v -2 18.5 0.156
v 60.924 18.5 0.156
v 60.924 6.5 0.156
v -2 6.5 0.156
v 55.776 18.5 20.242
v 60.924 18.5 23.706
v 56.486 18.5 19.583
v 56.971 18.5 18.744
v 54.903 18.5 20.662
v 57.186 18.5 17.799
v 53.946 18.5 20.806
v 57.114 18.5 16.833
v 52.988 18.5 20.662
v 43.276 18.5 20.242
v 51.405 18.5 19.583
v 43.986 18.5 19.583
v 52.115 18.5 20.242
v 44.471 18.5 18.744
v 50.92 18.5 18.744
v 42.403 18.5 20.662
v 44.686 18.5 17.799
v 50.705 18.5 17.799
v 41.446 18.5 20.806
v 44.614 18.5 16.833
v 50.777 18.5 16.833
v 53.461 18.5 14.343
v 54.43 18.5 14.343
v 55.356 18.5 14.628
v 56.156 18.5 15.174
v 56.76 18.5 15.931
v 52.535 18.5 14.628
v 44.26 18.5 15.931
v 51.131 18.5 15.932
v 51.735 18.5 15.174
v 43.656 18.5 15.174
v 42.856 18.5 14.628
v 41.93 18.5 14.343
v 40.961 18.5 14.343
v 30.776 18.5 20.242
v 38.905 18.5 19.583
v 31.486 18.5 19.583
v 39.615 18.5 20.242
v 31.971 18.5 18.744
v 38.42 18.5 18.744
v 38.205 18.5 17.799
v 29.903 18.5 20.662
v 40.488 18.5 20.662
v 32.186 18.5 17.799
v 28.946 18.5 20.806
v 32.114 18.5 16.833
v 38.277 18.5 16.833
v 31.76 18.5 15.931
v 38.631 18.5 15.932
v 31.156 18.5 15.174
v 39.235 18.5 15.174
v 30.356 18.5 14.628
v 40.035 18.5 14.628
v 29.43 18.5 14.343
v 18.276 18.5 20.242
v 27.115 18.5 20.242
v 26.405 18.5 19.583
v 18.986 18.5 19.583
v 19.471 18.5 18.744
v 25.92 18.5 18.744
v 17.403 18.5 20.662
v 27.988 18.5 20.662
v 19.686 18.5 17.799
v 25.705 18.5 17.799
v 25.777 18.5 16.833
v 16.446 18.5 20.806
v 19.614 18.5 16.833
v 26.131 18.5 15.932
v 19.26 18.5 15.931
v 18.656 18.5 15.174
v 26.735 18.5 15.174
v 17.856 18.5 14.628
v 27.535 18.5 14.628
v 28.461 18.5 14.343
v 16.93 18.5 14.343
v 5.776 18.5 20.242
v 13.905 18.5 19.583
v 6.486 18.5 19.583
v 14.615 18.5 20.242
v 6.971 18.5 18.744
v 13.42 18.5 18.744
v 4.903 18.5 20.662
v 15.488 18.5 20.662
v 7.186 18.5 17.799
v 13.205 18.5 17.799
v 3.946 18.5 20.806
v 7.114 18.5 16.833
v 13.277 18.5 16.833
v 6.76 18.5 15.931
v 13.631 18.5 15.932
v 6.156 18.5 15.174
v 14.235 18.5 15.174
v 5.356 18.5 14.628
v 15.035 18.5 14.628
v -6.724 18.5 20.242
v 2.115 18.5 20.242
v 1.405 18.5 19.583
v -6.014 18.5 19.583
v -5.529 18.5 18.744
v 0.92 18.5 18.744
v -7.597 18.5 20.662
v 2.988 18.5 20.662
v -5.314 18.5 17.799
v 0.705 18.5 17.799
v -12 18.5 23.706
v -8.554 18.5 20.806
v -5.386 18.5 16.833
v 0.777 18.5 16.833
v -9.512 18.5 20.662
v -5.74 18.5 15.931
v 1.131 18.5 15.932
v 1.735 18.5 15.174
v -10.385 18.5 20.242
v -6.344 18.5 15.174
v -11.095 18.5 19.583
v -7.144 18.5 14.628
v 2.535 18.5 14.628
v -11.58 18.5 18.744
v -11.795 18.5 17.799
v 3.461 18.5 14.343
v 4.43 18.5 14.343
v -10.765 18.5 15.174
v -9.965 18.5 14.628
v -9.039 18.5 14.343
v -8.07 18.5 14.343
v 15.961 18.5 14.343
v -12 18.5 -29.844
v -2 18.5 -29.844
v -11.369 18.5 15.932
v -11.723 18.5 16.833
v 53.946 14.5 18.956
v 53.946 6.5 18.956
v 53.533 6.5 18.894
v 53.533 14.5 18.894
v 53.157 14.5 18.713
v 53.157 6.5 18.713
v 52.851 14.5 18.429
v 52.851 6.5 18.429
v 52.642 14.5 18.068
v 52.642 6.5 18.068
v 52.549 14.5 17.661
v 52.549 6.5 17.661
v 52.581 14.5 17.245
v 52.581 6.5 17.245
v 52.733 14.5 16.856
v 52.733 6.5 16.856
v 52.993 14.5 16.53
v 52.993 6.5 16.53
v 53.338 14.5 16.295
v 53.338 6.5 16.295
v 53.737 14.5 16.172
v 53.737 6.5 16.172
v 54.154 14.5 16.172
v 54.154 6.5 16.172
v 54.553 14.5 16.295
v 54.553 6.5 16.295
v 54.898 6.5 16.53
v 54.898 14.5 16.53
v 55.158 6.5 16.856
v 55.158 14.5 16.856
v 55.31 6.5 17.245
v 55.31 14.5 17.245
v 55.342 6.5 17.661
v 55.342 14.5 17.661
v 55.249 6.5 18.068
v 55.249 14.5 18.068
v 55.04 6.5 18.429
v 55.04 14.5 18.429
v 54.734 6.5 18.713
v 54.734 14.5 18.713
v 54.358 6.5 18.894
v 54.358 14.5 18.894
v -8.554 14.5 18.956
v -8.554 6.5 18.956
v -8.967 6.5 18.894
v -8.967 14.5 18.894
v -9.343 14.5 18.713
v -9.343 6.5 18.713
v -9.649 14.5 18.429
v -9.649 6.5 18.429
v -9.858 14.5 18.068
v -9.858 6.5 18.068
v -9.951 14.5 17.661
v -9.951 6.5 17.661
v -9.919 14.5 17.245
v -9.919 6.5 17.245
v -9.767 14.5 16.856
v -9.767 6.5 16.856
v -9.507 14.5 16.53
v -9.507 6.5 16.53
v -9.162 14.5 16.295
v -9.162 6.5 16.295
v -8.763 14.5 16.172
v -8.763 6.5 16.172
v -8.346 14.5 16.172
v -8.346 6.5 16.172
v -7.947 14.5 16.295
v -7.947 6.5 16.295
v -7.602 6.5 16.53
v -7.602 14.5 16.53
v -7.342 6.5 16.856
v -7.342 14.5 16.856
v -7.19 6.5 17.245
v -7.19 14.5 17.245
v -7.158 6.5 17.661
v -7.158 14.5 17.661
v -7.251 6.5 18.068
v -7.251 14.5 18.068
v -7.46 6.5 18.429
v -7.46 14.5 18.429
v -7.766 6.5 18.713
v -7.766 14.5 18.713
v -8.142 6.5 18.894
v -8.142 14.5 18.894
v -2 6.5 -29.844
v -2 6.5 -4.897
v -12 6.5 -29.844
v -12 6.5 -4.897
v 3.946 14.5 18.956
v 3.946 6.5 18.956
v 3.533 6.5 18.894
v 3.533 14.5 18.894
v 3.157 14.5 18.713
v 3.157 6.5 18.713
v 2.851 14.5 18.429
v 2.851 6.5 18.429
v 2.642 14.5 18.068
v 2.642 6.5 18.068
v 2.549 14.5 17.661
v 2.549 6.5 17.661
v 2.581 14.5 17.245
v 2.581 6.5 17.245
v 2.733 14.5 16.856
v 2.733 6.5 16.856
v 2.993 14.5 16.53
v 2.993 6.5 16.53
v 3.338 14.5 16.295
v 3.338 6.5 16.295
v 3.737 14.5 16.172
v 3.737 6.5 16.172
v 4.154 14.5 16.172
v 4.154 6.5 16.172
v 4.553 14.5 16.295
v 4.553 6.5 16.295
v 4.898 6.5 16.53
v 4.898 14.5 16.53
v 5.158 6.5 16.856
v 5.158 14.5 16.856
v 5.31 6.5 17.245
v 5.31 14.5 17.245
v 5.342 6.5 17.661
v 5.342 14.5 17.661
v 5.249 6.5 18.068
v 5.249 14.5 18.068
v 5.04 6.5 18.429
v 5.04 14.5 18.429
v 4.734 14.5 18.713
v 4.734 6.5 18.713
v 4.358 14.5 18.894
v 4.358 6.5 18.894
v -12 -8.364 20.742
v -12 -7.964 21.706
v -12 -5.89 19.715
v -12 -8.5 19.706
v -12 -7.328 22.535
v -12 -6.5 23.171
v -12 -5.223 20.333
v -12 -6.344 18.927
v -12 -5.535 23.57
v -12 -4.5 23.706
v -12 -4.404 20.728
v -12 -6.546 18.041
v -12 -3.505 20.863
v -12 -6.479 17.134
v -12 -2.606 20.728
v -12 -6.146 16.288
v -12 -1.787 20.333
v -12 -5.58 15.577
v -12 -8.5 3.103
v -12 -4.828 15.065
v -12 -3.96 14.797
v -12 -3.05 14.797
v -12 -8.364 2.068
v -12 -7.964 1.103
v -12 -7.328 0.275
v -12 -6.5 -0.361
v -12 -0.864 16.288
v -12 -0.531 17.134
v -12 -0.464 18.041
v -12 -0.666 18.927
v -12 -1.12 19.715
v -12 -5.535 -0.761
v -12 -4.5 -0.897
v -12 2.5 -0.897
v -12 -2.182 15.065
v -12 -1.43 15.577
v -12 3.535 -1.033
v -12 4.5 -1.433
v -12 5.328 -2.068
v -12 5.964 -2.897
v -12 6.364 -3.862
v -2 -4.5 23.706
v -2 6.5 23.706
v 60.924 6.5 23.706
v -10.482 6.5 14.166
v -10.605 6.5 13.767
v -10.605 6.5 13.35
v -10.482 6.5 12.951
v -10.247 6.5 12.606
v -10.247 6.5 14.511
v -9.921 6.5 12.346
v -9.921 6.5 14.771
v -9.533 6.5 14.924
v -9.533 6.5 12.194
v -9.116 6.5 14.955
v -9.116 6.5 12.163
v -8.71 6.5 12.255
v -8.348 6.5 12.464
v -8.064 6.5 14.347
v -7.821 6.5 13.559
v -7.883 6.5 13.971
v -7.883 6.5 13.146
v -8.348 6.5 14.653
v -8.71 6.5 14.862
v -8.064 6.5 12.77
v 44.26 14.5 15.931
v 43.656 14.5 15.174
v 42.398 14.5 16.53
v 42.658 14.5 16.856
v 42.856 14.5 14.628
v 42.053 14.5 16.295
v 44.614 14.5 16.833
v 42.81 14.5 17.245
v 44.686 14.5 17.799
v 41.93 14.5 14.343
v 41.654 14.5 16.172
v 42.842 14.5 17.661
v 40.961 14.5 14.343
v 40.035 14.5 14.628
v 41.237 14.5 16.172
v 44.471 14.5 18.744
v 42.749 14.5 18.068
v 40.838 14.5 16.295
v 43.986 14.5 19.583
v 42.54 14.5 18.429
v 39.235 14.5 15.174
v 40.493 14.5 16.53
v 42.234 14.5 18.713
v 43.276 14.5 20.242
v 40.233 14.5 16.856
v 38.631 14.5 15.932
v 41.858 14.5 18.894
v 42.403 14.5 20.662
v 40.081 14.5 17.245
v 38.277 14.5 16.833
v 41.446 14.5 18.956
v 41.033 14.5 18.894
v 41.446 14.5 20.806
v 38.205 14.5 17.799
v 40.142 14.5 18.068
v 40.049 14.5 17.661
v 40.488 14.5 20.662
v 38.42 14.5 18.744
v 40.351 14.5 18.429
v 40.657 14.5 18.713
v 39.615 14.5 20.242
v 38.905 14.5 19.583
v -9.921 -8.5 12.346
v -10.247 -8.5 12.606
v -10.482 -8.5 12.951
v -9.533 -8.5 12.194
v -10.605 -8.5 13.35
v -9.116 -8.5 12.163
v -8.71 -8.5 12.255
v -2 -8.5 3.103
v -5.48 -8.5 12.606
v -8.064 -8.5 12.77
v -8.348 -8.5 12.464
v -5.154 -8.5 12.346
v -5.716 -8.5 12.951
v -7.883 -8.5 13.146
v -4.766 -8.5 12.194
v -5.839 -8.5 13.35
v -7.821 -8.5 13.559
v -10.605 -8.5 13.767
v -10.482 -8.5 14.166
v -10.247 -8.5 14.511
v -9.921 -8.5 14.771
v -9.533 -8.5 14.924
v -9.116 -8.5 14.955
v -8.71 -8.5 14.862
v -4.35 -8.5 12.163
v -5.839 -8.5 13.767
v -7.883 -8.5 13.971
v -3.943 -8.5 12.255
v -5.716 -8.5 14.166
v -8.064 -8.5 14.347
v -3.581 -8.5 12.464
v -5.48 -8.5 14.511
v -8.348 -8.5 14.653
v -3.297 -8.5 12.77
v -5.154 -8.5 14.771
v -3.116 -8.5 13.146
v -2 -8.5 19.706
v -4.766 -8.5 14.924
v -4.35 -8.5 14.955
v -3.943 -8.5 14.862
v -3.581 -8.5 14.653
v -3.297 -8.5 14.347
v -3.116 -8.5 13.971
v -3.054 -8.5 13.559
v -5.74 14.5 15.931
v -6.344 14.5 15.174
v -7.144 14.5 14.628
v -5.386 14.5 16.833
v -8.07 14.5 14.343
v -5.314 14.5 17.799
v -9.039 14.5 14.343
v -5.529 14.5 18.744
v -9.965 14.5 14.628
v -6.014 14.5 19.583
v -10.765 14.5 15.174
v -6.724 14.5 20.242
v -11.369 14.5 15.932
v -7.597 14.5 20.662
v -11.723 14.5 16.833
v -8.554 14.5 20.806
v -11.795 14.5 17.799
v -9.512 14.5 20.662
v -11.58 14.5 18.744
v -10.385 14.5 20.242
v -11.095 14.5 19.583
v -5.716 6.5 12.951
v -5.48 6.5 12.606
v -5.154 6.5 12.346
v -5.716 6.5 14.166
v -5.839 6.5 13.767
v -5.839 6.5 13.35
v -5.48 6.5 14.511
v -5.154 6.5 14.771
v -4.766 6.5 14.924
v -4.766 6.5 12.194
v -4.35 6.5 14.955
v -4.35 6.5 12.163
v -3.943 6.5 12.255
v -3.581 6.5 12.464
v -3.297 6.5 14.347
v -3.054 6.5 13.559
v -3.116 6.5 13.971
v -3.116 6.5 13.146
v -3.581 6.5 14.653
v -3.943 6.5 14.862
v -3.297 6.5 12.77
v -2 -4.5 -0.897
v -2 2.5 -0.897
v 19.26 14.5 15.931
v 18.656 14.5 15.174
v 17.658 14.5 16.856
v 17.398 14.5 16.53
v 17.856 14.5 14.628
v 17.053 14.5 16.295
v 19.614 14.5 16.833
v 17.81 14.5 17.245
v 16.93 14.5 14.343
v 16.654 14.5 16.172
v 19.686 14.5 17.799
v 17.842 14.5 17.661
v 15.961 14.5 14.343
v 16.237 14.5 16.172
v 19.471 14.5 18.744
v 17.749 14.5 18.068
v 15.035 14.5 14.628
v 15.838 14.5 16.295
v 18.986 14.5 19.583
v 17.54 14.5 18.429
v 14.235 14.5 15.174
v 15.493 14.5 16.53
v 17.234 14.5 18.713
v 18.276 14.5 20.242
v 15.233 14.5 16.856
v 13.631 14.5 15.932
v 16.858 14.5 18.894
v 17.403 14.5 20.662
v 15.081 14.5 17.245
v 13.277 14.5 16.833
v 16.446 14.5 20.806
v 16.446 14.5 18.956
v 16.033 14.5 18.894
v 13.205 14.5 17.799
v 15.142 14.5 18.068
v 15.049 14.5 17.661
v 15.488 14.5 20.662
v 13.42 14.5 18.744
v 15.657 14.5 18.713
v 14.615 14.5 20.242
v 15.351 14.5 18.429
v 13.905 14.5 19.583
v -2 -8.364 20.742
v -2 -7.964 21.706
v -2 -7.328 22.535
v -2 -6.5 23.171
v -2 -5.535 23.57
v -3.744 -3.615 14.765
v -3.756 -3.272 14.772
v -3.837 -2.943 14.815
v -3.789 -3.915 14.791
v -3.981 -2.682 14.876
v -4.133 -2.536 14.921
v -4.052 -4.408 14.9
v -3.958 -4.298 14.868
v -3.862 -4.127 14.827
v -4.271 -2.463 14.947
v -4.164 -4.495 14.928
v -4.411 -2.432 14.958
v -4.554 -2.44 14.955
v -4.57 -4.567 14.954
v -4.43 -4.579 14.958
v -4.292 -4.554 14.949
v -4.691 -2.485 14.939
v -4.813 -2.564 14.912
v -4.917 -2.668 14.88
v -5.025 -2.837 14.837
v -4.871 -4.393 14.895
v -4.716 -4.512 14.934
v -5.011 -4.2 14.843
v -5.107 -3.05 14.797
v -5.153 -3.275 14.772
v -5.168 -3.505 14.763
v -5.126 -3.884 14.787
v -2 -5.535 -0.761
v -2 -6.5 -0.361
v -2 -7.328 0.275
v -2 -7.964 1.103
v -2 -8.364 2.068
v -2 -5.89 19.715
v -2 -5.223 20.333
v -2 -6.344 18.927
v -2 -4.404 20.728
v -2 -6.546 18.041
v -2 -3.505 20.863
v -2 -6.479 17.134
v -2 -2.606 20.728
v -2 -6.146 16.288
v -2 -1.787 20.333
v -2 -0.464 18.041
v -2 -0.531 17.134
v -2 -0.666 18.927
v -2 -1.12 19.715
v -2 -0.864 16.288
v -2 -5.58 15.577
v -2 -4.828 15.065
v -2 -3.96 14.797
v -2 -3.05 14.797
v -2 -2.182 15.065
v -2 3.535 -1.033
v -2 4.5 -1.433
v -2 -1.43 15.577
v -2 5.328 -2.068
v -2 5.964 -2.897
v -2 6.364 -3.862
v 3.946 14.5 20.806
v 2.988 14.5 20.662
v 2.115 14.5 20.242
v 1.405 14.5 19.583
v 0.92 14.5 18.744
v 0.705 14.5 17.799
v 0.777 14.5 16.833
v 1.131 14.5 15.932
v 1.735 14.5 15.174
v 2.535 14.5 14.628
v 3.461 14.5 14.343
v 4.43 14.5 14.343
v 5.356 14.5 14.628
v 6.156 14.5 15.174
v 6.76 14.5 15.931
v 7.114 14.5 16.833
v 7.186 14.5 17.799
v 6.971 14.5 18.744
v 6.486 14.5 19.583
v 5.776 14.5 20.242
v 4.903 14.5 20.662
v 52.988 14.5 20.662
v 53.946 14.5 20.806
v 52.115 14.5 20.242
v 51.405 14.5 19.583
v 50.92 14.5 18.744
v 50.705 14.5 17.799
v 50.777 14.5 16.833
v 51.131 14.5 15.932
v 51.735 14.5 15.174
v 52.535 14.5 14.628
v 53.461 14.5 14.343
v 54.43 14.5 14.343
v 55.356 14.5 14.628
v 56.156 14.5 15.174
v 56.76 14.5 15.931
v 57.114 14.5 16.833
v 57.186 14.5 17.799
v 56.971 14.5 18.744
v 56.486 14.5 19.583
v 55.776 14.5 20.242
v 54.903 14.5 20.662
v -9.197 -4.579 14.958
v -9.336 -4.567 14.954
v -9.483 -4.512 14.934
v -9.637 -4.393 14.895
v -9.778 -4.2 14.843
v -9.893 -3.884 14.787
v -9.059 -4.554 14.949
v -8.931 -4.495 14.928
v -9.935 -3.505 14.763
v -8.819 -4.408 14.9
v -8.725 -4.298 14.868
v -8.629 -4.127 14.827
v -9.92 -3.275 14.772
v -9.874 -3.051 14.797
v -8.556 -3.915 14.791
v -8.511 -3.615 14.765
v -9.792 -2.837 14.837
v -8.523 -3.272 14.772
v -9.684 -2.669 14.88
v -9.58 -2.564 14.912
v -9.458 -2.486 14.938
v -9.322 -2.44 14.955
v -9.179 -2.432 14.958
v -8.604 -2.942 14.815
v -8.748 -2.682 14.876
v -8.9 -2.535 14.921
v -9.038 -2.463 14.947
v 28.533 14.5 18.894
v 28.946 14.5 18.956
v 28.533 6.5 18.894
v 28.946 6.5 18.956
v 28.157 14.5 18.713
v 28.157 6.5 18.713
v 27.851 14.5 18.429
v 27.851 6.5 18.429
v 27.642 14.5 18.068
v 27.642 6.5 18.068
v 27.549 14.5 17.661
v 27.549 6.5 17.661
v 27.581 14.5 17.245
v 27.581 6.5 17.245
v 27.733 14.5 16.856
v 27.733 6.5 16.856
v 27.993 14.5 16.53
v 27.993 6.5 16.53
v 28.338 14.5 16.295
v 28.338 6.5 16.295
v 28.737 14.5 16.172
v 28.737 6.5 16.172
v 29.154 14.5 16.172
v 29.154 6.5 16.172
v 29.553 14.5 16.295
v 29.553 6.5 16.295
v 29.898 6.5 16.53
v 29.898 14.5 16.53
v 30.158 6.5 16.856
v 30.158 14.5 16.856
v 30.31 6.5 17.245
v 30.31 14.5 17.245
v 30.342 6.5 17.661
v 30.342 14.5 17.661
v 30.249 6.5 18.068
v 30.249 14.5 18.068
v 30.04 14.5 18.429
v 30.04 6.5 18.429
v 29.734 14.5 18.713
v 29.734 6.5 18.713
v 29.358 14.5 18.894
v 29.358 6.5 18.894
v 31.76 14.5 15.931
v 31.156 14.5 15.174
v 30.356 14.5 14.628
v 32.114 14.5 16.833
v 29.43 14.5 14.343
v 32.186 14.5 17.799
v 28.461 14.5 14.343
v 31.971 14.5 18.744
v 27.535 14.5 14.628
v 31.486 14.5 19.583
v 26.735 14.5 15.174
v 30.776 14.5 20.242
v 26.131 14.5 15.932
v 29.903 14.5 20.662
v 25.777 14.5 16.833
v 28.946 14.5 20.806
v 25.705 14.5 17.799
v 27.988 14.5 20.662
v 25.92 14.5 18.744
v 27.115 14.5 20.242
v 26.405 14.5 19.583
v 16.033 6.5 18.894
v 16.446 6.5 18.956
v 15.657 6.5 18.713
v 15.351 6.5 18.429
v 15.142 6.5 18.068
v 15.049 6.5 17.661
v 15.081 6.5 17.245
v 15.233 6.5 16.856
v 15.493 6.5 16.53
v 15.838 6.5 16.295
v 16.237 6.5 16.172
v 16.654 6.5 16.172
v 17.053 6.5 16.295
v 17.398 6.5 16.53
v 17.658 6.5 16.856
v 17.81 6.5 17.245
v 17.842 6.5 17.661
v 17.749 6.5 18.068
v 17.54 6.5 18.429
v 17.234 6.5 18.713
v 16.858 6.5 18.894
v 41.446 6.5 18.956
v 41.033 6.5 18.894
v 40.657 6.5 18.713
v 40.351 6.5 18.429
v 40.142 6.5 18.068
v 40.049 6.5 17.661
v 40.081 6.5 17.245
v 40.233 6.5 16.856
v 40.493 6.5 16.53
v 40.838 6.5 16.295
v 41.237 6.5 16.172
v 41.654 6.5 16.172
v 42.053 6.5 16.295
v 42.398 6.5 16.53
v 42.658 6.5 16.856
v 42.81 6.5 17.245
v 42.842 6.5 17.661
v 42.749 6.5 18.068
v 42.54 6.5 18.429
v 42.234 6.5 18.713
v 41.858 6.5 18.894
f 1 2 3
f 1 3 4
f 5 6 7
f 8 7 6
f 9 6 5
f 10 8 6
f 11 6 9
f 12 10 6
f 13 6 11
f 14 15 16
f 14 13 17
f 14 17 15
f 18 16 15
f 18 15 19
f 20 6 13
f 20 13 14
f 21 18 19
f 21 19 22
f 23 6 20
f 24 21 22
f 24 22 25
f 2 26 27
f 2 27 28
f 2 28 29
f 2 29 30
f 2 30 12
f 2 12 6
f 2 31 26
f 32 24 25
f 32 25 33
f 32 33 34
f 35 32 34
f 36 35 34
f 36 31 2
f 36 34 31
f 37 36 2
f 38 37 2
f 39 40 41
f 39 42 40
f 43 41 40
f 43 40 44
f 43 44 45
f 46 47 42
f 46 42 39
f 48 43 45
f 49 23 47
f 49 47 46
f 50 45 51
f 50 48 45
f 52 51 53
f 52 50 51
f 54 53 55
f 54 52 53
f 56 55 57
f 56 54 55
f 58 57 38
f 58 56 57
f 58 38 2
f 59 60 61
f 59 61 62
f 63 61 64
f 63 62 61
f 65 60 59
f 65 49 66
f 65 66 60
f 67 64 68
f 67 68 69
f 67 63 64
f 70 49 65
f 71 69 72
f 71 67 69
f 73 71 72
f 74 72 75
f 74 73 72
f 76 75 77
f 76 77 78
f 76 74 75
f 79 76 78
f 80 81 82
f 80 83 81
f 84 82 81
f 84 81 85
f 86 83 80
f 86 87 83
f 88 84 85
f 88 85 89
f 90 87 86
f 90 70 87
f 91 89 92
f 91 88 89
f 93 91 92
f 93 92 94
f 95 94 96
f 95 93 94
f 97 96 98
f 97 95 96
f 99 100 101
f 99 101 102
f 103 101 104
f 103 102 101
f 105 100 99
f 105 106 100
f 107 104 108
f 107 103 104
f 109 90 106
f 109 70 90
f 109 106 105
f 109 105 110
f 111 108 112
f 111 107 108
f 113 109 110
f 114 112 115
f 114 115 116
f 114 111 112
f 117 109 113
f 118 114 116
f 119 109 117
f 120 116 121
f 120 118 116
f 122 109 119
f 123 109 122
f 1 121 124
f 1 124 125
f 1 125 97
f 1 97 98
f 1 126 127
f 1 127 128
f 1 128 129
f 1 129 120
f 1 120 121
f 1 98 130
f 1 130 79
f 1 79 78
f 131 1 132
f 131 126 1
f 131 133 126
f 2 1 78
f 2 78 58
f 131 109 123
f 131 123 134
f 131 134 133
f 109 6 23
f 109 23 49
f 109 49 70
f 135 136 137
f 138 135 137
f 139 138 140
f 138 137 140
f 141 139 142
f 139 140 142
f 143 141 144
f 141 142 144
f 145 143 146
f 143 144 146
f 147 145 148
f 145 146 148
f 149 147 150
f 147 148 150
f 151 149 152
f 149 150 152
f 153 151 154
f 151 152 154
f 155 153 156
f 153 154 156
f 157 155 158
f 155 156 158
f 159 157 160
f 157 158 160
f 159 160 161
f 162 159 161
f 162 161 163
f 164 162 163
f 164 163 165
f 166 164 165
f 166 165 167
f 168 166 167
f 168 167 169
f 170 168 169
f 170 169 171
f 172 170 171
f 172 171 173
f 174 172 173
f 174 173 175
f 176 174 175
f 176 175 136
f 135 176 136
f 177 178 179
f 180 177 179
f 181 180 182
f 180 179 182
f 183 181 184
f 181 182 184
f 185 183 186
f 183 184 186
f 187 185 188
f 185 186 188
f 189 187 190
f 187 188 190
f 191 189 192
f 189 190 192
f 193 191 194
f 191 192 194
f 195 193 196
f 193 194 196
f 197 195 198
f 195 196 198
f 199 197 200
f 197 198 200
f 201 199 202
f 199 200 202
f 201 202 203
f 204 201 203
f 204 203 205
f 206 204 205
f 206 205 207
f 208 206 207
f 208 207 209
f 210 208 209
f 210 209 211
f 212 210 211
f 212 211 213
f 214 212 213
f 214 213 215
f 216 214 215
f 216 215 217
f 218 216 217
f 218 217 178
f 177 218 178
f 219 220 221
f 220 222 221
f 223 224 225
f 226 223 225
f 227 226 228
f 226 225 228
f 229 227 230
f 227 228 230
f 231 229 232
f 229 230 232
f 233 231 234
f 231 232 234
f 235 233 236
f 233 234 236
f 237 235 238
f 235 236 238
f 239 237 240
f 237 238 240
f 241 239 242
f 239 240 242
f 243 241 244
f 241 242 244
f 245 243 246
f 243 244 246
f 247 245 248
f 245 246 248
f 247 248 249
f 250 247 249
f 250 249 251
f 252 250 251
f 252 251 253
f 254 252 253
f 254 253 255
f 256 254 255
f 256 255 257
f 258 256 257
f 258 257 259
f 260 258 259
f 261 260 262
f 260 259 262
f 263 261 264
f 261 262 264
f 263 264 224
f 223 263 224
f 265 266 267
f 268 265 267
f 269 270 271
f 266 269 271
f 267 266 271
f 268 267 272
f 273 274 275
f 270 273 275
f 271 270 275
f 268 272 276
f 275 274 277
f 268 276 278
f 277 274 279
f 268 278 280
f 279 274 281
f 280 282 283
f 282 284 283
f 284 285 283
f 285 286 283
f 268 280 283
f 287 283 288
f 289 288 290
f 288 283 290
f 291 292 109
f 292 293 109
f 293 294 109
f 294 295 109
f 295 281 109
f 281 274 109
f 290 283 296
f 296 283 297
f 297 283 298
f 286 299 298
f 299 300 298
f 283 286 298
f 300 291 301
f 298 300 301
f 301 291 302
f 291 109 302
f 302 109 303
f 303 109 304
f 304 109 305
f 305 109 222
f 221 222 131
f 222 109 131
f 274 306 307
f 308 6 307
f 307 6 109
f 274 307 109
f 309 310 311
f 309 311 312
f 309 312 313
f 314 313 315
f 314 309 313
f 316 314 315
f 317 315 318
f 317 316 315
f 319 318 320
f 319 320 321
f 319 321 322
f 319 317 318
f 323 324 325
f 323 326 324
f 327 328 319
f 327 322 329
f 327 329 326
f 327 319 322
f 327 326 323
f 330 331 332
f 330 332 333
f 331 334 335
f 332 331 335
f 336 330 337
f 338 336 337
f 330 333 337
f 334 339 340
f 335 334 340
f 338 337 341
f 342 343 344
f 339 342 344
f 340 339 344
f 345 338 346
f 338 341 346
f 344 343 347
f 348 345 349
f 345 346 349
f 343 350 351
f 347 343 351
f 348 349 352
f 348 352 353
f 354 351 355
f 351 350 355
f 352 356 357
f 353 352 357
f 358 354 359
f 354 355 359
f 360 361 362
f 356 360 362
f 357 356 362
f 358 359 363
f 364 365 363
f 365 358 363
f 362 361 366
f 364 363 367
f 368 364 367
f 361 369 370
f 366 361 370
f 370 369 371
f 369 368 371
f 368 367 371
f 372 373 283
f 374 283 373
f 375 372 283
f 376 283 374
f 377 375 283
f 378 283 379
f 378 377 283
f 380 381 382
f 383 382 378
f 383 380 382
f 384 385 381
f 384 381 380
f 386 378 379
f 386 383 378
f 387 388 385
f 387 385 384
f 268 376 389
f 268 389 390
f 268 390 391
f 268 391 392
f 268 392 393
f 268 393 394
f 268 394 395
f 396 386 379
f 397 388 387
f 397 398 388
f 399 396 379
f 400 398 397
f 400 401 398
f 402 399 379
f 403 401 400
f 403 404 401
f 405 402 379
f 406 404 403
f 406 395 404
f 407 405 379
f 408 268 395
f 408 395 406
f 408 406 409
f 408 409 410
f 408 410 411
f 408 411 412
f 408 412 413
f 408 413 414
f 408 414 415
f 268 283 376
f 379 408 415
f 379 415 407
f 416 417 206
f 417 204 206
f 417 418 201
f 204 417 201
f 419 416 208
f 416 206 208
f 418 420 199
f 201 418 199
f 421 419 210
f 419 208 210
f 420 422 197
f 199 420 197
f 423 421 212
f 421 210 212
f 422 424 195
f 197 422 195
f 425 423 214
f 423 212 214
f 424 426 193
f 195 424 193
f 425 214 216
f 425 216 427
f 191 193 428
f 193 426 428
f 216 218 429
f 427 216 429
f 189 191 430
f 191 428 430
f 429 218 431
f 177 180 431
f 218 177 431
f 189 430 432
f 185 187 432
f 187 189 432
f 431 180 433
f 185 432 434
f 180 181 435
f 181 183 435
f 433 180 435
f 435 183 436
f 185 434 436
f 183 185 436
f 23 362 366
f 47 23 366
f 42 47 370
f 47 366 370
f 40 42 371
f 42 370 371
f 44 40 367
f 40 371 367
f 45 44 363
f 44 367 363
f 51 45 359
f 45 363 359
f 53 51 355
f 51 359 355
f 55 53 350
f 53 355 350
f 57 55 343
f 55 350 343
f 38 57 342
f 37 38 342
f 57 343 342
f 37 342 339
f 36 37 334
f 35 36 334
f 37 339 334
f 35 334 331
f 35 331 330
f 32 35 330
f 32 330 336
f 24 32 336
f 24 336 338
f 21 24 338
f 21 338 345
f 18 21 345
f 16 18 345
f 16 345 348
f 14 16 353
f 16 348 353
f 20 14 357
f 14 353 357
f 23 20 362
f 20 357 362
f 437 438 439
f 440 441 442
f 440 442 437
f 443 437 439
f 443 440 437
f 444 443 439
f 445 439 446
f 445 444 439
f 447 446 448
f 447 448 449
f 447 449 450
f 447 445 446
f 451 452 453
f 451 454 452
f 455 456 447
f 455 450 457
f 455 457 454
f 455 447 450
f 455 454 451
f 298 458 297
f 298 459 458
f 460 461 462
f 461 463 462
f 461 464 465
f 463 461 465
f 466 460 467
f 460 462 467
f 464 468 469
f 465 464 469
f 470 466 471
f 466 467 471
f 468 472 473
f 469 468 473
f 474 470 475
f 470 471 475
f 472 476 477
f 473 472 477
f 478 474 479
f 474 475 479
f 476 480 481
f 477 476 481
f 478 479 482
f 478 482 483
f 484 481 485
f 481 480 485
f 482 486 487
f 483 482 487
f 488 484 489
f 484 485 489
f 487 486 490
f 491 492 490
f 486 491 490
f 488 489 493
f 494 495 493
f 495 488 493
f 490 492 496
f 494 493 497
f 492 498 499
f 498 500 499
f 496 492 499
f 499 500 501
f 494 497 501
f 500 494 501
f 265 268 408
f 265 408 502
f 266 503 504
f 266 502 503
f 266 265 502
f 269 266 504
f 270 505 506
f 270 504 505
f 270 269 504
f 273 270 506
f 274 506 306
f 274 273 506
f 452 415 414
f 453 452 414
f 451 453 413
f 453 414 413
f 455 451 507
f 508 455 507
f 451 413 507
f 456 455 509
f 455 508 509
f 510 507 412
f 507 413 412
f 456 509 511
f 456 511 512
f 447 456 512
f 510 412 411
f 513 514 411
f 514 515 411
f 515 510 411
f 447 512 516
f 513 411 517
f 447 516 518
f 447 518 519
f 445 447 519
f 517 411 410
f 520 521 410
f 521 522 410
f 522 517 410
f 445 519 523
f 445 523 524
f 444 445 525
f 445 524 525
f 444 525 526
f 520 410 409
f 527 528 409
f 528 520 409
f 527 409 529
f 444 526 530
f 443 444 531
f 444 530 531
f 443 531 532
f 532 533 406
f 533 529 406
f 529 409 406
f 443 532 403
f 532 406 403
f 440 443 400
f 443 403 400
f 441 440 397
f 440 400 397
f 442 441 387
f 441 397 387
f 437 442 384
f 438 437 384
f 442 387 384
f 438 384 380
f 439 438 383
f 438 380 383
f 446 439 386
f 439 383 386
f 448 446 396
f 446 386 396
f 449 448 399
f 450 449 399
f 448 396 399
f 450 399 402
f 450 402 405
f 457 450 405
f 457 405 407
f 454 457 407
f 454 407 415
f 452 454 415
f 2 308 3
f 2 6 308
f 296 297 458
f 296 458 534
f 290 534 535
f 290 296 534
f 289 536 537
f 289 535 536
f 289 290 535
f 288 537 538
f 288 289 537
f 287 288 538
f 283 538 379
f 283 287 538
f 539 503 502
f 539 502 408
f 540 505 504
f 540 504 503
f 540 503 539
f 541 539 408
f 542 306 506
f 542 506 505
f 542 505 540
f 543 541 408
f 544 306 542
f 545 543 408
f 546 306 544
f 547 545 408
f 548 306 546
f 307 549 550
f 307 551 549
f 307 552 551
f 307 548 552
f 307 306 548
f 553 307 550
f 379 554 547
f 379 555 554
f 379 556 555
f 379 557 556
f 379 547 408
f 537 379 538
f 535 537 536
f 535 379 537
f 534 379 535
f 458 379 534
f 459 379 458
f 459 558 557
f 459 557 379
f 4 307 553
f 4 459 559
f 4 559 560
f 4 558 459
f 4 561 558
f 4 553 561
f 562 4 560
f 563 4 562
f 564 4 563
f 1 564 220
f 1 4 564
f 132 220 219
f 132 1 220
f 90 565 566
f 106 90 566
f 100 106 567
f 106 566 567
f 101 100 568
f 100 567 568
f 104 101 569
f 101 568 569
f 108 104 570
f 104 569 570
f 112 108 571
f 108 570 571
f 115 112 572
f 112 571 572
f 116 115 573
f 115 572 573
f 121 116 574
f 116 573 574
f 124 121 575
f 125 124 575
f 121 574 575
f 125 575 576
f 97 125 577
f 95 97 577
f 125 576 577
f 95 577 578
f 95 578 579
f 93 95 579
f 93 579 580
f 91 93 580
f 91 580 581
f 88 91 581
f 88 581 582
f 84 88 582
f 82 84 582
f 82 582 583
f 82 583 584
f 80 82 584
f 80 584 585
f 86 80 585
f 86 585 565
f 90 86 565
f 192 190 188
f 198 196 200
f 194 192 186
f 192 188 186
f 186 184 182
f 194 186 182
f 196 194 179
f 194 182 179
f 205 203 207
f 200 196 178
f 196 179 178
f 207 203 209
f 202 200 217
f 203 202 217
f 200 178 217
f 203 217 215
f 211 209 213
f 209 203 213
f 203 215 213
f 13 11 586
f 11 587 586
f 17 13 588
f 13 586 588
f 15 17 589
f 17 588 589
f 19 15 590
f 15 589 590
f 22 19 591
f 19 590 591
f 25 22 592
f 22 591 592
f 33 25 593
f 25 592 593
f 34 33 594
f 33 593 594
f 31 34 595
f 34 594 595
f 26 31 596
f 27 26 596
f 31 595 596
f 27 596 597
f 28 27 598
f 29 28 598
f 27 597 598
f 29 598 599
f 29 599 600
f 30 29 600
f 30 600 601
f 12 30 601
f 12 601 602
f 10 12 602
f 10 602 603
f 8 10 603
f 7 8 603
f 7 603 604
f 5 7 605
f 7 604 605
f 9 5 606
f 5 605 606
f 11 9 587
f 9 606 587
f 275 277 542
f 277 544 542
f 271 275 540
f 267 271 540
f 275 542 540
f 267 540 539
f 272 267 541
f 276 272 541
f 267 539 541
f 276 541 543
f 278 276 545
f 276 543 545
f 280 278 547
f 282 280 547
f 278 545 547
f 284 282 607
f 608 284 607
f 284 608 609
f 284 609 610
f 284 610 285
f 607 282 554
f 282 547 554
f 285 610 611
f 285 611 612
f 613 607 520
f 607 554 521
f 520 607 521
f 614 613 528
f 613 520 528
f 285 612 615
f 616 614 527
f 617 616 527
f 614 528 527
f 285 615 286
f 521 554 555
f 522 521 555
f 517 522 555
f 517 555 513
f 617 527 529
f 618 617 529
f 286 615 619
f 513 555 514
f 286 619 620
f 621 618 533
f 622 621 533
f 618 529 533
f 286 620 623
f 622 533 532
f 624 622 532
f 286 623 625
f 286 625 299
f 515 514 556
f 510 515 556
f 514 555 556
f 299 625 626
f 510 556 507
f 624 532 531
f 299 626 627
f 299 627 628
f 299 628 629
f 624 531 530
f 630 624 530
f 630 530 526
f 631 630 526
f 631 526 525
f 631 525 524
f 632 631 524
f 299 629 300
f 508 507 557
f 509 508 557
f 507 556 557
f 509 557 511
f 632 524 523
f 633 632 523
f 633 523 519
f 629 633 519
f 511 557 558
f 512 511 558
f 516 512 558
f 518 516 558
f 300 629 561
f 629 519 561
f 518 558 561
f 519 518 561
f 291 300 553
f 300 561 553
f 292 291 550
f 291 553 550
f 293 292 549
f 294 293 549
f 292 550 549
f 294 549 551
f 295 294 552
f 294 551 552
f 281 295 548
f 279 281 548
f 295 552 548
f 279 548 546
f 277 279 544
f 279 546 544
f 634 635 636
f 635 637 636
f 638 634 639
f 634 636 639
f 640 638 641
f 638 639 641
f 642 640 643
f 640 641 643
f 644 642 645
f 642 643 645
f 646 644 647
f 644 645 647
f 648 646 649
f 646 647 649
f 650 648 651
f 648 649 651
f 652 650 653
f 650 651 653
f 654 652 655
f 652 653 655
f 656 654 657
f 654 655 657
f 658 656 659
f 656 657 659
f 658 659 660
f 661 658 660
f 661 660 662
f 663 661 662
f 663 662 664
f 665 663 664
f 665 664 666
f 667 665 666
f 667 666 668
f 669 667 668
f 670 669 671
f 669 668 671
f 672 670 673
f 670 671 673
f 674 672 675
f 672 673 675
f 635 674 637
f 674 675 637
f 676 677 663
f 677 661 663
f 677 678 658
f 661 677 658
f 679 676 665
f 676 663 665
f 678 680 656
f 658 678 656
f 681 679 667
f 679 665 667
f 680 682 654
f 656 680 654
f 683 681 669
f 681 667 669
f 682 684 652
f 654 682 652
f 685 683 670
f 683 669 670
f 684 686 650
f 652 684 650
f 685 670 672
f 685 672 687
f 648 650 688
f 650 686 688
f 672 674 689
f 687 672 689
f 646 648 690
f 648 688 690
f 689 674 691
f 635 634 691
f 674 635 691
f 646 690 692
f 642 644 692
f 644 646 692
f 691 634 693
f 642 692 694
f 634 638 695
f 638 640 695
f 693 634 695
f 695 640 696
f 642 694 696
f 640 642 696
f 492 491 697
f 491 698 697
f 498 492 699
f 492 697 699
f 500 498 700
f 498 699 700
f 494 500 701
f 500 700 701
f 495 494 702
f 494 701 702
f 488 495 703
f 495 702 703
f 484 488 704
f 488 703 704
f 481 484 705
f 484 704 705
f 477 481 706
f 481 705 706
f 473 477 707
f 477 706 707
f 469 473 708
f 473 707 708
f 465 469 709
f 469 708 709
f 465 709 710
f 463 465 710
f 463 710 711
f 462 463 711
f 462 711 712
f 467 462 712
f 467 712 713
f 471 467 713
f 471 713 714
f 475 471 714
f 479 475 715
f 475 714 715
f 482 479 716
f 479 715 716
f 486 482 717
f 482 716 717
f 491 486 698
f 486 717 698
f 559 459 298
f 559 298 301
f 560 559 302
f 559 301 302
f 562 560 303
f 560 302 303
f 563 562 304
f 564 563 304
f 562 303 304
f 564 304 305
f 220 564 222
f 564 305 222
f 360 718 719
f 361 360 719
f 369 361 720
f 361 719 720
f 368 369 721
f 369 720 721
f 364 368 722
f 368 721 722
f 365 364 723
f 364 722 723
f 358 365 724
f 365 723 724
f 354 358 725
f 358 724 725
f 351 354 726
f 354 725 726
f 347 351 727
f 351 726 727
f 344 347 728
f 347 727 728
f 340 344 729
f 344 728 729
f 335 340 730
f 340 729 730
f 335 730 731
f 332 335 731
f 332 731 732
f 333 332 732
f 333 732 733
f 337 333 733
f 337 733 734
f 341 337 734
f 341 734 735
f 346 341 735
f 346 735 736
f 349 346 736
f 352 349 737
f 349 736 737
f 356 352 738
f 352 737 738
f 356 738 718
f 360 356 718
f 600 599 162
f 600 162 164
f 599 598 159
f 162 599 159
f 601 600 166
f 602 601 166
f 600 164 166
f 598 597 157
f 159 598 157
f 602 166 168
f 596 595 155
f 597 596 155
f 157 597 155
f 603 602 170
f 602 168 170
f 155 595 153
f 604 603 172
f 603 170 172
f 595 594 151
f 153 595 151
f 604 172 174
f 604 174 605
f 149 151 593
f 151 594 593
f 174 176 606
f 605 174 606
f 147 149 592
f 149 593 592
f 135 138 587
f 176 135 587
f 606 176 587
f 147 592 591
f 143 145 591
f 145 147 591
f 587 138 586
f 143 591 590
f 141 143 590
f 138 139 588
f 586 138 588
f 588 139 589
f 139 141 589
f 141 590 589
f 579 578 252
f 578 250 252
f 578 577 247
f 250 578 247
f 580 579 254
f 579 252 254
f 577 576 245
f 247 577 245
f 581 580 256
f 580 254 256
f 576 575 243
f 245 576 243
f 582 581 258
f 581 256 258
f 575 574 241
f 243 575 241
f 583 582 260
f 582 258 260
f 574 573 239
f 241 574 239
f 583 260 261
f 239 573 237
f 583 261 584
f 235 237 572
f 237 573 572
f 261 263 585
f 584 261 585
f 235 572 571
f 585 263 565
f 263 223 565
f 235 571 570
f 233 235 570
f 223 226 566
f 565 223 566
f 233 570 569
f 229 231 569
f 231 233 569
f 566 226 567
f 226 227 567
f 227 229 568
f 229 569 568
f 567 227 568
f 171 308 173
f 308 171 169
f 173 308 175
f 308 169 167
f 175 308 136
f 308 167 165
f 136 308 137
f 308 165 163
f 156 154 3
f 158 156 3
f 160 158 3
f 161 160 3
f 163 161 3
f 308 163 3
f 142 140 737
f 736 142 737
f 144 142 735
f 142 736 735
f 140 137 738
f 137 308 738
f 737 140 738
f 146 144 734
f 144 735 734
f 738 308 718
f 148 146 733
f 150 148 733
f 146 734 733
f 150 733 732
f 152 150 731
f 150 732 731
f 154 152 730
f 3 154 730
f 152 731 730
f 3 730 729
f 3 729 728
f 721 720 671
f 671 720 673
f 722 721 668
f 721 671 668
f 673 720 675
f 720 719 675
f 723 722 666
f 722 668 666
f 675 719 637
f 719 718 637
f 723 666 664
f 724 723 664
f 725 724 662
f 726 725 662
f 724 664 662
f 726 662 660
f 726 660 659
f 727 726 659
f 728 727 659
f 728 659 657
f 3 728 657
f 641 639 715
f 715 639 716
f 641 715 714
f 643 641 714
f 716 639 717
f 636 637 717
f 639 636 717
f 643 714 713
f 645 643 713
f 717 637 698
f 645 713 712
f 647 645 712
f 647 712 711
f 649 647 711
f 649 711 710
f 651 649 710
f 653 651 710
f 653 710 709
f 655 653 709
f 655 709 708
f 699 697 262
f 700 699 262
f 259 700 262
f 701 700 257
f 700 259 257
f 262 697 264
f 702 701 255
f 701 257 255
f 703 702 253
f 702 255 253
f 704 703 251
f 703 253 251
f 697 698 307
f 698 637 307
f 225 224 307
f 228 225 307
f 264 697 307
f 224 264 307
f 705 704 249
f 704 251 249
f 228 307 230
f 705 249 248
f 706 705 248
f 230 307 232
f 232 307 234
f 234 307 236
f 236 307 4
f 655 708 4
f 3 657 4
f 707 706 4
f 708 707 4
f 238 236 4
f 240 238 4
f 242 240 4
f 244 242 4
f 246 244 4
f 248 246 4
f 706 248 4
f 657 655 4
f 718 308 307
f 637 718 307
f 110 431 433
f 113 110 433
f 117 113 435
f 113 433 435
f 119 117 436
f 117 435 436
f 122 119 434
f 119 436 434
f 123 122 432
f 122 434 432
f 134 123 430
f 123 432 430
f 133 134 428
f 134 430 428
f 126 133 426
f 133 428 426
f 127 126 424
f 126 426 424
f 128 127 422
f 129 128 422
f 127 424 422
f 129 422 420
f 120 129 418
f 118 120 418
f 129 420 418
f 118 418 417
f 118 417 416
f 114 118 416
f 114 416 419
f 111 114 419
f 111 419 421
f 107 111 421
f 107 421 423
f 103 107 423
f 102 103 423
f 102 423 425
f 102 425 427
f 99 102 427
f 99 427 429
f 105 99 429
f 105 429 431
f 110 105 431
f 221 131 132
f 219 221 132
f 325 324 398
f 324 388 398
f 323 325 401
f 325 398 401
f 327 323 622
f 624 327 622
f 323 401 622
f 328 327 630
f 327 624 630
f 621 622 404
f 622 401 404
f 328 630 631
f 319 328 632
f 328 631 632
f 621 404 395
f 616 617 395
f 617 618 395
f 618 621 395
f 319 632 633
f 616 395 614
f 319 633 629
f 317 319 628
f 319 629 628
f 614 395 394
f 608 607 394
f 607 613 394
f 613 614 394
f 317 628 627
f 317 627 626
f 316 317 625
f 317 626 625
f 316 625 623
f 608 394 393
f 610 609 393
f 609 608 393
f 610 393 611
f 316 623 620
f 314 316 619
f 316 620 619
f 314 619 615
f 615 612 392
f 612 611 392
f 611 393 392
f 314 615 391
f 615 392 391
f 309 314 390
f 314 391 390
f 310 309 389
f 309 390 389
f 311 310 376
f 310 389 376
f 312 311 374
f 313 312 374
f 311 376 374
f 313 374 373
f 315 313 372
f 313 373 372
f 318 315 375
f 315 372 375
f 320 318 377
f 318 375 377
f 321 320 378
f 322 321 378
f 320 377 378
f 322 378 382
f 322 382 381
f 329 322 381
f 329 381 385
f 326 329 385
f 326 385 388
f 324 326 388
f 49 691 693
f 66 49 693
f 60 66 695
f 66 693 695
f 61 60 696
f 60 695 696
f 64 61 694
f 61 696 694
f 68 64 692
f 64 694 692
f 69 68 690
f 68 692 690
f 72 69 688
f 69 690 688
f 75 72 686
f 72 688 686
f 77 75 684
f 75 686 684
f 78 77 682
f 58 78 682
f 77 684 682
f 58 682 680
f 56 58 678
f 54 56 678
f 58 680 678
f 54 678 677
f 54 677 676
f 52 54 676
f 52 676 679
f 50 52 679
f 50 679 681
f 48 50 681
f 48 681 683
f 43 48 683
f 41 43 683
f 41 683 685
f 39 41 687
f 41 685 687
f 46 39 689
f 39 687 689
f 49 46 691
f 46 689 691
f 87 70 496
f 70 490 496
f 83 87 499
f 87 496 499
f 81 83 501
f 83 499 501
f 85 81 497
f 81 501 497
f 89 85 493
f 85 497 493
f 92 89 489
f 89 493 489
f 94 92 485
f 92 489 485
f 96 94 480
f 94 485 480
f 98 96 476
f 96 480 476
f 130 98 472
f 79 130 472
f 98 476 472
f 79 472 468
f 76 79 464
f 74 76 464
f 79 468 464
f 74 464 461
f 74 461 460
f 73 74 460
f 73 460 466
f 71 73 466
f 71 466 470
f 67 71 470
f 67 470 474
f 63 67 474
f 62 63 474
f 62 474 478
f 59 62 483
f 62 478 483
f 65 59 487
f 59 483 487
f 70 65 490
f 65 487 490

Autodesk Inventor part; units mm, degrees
ref_plane "YZ Plane" through (0, 0, 0) normal (1, 0, 0) x (0, 1, 0)
ref_plane "XZ Plane" through (0, 0, 0) normal (0, 1, 0) x (-1, 0, 0)
ref_plane "XY Plane" through (0, 0, 0) normal (0, 0, 1) x (1, 0, 0)
ref_plane "Work Plane1" through (18, 18.5, -30) normal (0, 1, 0) x (0, 0, -1)
sketch "Sketch1" plane through (18, 18.5, -30) normal (0, 1, 0) x (0, 0, -1)
  line L0 (-30.1565, -29.8905) -> (-15.0465, -29.8905) construction
  line L1 (-30, -38) -> (-30, 18) construction
  circle A0 centre (-25, -20) radius 1.45 construction
  circle A1 centre (25, -20) radius 1.45 construction
  circle A2 centre (25, 0) radius 1.45 construction
  circle A3 centre (-25, 0) radius 1.45 construction
  circle A4 centre (10, -35) radius 1.45 construction
  circle A5 centre (10, 15) radius 1.45 construction
  circle A6 centre (-10, 15) radius 1.45 construction
  circle A7 centre (-10, -35) radius 1.45 construction
  circle A8 centre (25, 15) radius 2.325 construction
  circle A9 centre (-25, -35) radius 2.325 construction
  circle A10 centre (25, -35) radius 2.325 construction
  circle A11 centre (-25, 15) radius 2.325 construction
  line L2 (-28, 20) -> (-30, 18) construction
  line L3 (-28, 20) -> (28, 20) construction
  line L4 (30, 18) -> (28, 20) construction
  line L5 (30, 18) -> (30, -38) construction
  line L6 (28, -40) -> (30, -38) construction
  line L7 (28, -40) -> (-28, -40) construction
  line L8 (-30, -38) -> (-28, -40) construction
  line L9 (-30, -38) -> (-30, 18) construction
  circle A12 centre (17.5, -27.5) radius 1.95 construction
  circle A13 centre (-17.5, 7.5) radius 1.95 construction
  circle A14 centre (-17.5, -27.5) radius 1.95 construction
  circle A15 centre (17.5, 7.5) radius 1.95 construction
  circle A16 centre (0, -10) radius 7.5 construction
  line L10 (-0.1565, 20) -> (-30.1565, 20)
  line L11 (-30.1565, 20) -> (-30.1565, 30)
  line L12 (-30.1565, 30) -> (-0.1565, 30)
  line L13 (-0.1565, 30) -> (-0.1565, 20)
  line L14 (-30.1565, 30) -> (-53.7065, 30)
  line L15 (-53.7065, 30) -> (-53.7065, -42.9244)
  line L16 (-53.7065, -42.9244) -> (-30.1565, -42.9244)
  line L17 (-30.1565, -42.9244) -> (-30.1565, 30)
  circle A17 centre (-47.5565, 1.5545) radius 1.75 construction
  circle A18 centre (-47.5565, -10.9455) radius 1.75 construction
  circle A19 centre (-47.5565, -23.4455) radius 1.75 construction
  circle A20 centre (-47.5565, -35.9455) radius 1.75 construction
  line L18 (-41.6065, -40.3471) -> (-53.7065, -40.3471) construction
  line L19 (-41.6065, -40.3471) -> (-41.6065, 9.6529) construction
  line L20 (-41.6065, 9.6529) -> (-53.7065, 9.6529) construction
  line L21 (-53.7065, -40.3471) -> (-53.7065, 9.6529) construction
  circle A21 centre (-47.5565, -48.4455) radius 1.75 construction
  circle A22 centre (-47.5565, -60.9455) radius 1.75 construction
  circle A23 centre (-47.5565, -73.4455) radius 1.75 construction
  circle A24 centre (-47.5565, -85.9455) radius 1.75 construction
  line L22 (-41.6065, -90.3471) -> (-53.7065, -90.3471) construction
  line L23 (-41.6065, -90.3471) -> (-41.6065, -40.3471) construction
  line L24 (-41.6065, -40.3471) -> (-53.7065, -40.3471) construction
  line L25 (-53.7065, -90.3471) -> (-53.7065, -40.3471) construction
  point P0 (-30.1565, 20)
  dimension "d0" = 10
  dimension "d1" = 30
extrude "Extrusion1" add sketch "Sketch1" against normal blind 12
sketch "Sketch2" plane through (18, 18.5, -30) normal (0, 1, 0) x (1, 0, 0)
  circle A0 centre (35.9455, -47.5565) radius 1.75 projected
  point P0 (-18, -30)
hole "Hole1" at (53.9455, 18.5, 17.5565) direction (0, -1, 0) diameter 2.8 end through all counterbore diameter 6.5 counterbore depth 4
pattern_linear "Rectangular Pattern1" count 9 spacing 12.5 along (-1, 0, 0) of "Hole1"
sketch "Sketch3" plane through (18, 6.5, -30) normal (0, -1, 0) x (1, 0, 0)
  line L0 (-30, 53.7065) -> (-30, 0.1565) projected
  line L1 (-30, 0.1565) -> (-20, 0.1565) projected
  line L2 (-20, 0.1565) -> (-20, 30.1565) projected
  line L3 (-20, 30.1565) -> (42.9244, 30.1565) projected
  line L4 (42.9244, 30.1565) -> (42.9244, 53.7065) projected
  line L5 (42.9244, 53.7065) -> (-30, 53.7065) projected
  line L6 (-30, 53.7065) -> (42.9244, 53.7065) projected
  line L7 (-30, 53.7065) -> (-20, 53.7065)
  line L8 (-20, 53.7065) -> (-20, 29.1031)
  line L9 (-20, 29.1031) -> (-30, 29.1031)
  line L10 (-30, 29.1031) -> (-30, 53.7065)
  point P0 (-18, 30)
  point P1 (-30, 29.1031)
  dimension "d14" = 10
extrude "Extrusion2" add sketch "Sketch3" along normal blind 15 contours L5 L8 L2 L9 L0
sketch "Sketch4" plane through (-12, 18.5, -29.8435) normal (-1, 0, 0) x (0, 0, 1)
  line L0 (0, 0) -> (53.55, 0) projected
  line L1 (0, 0) -> (0, -12) projected
  line L2 (28.9466, -12) -> (0, -12) projected
  line L3 (28.9466, -12) -> (28.9466, -27) projected
  line L4 (53.55, -27) -> (28.9466, -27) projected
  line L5 (53.55, 0) -> (53.55, -27) projected
  circle A0 centre (40.6, -17.5571) radius 2.1 projected
  circle A1 centre (47.6565, -22.005) radius 1.6829
  arc A2 (53.5014, -16.3734) -> (53.6565, -16.1421) centre (53.4065, -16.1421) ccw construction
  arc A3 (53.5014, -16.3734) -> (52.9237, -16.8727) centre (53.9565, -17.4838) ccw construction
  arc A4 (52.7304, -16.9945) -> (52.9237, -16.8727) centre (52.7086, -16.7455) ccw construction
  line L6 (52.7304, -16.9945) -> (52.3847, -17.0247) construction
  arc A5 (52.3847, -17.0247) -> (52.1565, -17.2738) centre (52.4065, -17.2738) ccw construction
  line L7 (52.1565, -17.2738) -> (52.1565, -17.7262) construction
  arc A6 (52.1565, -17.7262) -> (52.3847, -17.9753) centre (52.4065, -17.7262) ccw construction
  line L8 (52.3847, -17.9753) -> (52.7513, -18.0073) construction
  arc A7 (52.9411, -18.1232) -> (52.7513, -18.0073) centre (52.7295, -18.2564) ccw construction
  arc A8 (52.9411, -18.1232) -> (53.5014, -18.5941) centre (53.9565, -17.4838) ccw construction
  arc A9 (53.6565, -18.8254) -> (53.5014, -18.5941) centre (53.4065, -18.8254) ccw construction
  line L9 (53.6565, -18.8254) -> (53.6565, -19.5) construction
  line L10 (53.6565, -19.5) -> (53.1565, -20) construction
  line L11 (53.1565, -20) -> (42.1566, -20) construction
  line L12 (42.1566, -20) -> (41.6566, -19.5) construction
  line L13 (41.6566, -19.5) -> (41.6566, -18.8254) construction
  arc A10 (41.8117, -18.5941) -> (41.6566, -18.8254) centre (41.9066, -18.8254) ccw construction
  arc A11 (41.8117, -18.5941) -> (42.372, -18.1232) centre (41.3566, -17.4838) ccw construction
  arc A12 (42.5618, -18.0073) -> (42.372, -18.1232) centre (42.5836, -18.2564) ccw construction
  line L14 (42.5618, -18.0073) -> (42.9283, -17.9753) construction
  arc A13 (42.9283, -17.9753) -> (43.1566, -17.7262) centre (42.9066, -17.7262) ccw construction
  line L15 (43.1566, -17.7262) -> (43.1566, -17.2738) construction
  arc A14 (43.1566, -17.2738) -> (42.9283, -17.0247) centre (42.9066, -17.2738) ccw construction
  line L16 (42.9283, -17.0247) -> (42.5827, -16.9945) construction
  arc A15 (42.3894, -16.8727) -> (42.5827, -16.9945) centre (42.6045, -16.7455) ccw construction
  arc A16 (42.3894, -16.8727) -> (41.8117, -16.3734) centre (41.3566, -17.4838) ccw construction
  arc A17 (41.6566, -16.1421) -> (41.8117, -16.3734) centre (41.9066, -16.1421) ccw construction
  line L17 (41.6566, -16.1421) -> (41.6566, -15) construction
  line L18 (41.6566, -15) -> (35.0566, -15) construction
  line L19 (35.0566, -15) -> (34.4566, -15.6) construction
  line L20 (34.4566, -15.6) -> (34.4566, -23.4) construction
  line L21 (34.4566, -23.4) -> (35.6565, -24.6) construction
  line L22 (35.6565, -24.6) -> (59.6565, -24.6) construction
  line L23 (59.6565, -24.6) -> (60.8565, -23.4) construction
  line L24 (60.8565, -23.4) -> (60.8565, -15.6) construction
  line L25 (60.8565, -15.6) -> (60.2565, -15) construction
  line L26 (60.2565, -15) -> (53.6565, -15) construction
  line L27 (53.6565, -15) -> (53.6565, -16.1421) construction
  circle A18 centre (40.7565, -22.005) radius 2.1 construction
  circle A19 centre (54.5565, -22.005) radius 2.1 construction
  point P0 (29.8435, -18.5)
hole "Hole2" at (-12, -3.505, 17.8131) direction (1, 0, 0) diameter 6.1 end through all
fillet "Fillet1" radius 4 3 edges at (-7, -8.5, 23.7065) (-7, -8.5, -0.8969) (-7, 6.5, -0.8969)
sketch "Sketch5" plane through (18, -8.5, -30) normal (0, -1, 0) x (1, 0, 0)
  line L0 (-20, 43.8065) -> (-30, 43.8065) construction
  circle A0 centre (-22.4542, 43.5587) radius 1.4
  circle A1 centre (-27.2211, 43.5587) radius 1.4
  line L1 (-20, 44.7631) -> (-30, 44.7631) projected
  point P0 (-18, 30)
  dimension "d28" = 2.8
  dimension "d29" = 2.8
extrude "Extrusion3" cut sketch "Sketch5" against normal blind 15
properties part number "30_cellSTORM_UC2_Laser_slider"
